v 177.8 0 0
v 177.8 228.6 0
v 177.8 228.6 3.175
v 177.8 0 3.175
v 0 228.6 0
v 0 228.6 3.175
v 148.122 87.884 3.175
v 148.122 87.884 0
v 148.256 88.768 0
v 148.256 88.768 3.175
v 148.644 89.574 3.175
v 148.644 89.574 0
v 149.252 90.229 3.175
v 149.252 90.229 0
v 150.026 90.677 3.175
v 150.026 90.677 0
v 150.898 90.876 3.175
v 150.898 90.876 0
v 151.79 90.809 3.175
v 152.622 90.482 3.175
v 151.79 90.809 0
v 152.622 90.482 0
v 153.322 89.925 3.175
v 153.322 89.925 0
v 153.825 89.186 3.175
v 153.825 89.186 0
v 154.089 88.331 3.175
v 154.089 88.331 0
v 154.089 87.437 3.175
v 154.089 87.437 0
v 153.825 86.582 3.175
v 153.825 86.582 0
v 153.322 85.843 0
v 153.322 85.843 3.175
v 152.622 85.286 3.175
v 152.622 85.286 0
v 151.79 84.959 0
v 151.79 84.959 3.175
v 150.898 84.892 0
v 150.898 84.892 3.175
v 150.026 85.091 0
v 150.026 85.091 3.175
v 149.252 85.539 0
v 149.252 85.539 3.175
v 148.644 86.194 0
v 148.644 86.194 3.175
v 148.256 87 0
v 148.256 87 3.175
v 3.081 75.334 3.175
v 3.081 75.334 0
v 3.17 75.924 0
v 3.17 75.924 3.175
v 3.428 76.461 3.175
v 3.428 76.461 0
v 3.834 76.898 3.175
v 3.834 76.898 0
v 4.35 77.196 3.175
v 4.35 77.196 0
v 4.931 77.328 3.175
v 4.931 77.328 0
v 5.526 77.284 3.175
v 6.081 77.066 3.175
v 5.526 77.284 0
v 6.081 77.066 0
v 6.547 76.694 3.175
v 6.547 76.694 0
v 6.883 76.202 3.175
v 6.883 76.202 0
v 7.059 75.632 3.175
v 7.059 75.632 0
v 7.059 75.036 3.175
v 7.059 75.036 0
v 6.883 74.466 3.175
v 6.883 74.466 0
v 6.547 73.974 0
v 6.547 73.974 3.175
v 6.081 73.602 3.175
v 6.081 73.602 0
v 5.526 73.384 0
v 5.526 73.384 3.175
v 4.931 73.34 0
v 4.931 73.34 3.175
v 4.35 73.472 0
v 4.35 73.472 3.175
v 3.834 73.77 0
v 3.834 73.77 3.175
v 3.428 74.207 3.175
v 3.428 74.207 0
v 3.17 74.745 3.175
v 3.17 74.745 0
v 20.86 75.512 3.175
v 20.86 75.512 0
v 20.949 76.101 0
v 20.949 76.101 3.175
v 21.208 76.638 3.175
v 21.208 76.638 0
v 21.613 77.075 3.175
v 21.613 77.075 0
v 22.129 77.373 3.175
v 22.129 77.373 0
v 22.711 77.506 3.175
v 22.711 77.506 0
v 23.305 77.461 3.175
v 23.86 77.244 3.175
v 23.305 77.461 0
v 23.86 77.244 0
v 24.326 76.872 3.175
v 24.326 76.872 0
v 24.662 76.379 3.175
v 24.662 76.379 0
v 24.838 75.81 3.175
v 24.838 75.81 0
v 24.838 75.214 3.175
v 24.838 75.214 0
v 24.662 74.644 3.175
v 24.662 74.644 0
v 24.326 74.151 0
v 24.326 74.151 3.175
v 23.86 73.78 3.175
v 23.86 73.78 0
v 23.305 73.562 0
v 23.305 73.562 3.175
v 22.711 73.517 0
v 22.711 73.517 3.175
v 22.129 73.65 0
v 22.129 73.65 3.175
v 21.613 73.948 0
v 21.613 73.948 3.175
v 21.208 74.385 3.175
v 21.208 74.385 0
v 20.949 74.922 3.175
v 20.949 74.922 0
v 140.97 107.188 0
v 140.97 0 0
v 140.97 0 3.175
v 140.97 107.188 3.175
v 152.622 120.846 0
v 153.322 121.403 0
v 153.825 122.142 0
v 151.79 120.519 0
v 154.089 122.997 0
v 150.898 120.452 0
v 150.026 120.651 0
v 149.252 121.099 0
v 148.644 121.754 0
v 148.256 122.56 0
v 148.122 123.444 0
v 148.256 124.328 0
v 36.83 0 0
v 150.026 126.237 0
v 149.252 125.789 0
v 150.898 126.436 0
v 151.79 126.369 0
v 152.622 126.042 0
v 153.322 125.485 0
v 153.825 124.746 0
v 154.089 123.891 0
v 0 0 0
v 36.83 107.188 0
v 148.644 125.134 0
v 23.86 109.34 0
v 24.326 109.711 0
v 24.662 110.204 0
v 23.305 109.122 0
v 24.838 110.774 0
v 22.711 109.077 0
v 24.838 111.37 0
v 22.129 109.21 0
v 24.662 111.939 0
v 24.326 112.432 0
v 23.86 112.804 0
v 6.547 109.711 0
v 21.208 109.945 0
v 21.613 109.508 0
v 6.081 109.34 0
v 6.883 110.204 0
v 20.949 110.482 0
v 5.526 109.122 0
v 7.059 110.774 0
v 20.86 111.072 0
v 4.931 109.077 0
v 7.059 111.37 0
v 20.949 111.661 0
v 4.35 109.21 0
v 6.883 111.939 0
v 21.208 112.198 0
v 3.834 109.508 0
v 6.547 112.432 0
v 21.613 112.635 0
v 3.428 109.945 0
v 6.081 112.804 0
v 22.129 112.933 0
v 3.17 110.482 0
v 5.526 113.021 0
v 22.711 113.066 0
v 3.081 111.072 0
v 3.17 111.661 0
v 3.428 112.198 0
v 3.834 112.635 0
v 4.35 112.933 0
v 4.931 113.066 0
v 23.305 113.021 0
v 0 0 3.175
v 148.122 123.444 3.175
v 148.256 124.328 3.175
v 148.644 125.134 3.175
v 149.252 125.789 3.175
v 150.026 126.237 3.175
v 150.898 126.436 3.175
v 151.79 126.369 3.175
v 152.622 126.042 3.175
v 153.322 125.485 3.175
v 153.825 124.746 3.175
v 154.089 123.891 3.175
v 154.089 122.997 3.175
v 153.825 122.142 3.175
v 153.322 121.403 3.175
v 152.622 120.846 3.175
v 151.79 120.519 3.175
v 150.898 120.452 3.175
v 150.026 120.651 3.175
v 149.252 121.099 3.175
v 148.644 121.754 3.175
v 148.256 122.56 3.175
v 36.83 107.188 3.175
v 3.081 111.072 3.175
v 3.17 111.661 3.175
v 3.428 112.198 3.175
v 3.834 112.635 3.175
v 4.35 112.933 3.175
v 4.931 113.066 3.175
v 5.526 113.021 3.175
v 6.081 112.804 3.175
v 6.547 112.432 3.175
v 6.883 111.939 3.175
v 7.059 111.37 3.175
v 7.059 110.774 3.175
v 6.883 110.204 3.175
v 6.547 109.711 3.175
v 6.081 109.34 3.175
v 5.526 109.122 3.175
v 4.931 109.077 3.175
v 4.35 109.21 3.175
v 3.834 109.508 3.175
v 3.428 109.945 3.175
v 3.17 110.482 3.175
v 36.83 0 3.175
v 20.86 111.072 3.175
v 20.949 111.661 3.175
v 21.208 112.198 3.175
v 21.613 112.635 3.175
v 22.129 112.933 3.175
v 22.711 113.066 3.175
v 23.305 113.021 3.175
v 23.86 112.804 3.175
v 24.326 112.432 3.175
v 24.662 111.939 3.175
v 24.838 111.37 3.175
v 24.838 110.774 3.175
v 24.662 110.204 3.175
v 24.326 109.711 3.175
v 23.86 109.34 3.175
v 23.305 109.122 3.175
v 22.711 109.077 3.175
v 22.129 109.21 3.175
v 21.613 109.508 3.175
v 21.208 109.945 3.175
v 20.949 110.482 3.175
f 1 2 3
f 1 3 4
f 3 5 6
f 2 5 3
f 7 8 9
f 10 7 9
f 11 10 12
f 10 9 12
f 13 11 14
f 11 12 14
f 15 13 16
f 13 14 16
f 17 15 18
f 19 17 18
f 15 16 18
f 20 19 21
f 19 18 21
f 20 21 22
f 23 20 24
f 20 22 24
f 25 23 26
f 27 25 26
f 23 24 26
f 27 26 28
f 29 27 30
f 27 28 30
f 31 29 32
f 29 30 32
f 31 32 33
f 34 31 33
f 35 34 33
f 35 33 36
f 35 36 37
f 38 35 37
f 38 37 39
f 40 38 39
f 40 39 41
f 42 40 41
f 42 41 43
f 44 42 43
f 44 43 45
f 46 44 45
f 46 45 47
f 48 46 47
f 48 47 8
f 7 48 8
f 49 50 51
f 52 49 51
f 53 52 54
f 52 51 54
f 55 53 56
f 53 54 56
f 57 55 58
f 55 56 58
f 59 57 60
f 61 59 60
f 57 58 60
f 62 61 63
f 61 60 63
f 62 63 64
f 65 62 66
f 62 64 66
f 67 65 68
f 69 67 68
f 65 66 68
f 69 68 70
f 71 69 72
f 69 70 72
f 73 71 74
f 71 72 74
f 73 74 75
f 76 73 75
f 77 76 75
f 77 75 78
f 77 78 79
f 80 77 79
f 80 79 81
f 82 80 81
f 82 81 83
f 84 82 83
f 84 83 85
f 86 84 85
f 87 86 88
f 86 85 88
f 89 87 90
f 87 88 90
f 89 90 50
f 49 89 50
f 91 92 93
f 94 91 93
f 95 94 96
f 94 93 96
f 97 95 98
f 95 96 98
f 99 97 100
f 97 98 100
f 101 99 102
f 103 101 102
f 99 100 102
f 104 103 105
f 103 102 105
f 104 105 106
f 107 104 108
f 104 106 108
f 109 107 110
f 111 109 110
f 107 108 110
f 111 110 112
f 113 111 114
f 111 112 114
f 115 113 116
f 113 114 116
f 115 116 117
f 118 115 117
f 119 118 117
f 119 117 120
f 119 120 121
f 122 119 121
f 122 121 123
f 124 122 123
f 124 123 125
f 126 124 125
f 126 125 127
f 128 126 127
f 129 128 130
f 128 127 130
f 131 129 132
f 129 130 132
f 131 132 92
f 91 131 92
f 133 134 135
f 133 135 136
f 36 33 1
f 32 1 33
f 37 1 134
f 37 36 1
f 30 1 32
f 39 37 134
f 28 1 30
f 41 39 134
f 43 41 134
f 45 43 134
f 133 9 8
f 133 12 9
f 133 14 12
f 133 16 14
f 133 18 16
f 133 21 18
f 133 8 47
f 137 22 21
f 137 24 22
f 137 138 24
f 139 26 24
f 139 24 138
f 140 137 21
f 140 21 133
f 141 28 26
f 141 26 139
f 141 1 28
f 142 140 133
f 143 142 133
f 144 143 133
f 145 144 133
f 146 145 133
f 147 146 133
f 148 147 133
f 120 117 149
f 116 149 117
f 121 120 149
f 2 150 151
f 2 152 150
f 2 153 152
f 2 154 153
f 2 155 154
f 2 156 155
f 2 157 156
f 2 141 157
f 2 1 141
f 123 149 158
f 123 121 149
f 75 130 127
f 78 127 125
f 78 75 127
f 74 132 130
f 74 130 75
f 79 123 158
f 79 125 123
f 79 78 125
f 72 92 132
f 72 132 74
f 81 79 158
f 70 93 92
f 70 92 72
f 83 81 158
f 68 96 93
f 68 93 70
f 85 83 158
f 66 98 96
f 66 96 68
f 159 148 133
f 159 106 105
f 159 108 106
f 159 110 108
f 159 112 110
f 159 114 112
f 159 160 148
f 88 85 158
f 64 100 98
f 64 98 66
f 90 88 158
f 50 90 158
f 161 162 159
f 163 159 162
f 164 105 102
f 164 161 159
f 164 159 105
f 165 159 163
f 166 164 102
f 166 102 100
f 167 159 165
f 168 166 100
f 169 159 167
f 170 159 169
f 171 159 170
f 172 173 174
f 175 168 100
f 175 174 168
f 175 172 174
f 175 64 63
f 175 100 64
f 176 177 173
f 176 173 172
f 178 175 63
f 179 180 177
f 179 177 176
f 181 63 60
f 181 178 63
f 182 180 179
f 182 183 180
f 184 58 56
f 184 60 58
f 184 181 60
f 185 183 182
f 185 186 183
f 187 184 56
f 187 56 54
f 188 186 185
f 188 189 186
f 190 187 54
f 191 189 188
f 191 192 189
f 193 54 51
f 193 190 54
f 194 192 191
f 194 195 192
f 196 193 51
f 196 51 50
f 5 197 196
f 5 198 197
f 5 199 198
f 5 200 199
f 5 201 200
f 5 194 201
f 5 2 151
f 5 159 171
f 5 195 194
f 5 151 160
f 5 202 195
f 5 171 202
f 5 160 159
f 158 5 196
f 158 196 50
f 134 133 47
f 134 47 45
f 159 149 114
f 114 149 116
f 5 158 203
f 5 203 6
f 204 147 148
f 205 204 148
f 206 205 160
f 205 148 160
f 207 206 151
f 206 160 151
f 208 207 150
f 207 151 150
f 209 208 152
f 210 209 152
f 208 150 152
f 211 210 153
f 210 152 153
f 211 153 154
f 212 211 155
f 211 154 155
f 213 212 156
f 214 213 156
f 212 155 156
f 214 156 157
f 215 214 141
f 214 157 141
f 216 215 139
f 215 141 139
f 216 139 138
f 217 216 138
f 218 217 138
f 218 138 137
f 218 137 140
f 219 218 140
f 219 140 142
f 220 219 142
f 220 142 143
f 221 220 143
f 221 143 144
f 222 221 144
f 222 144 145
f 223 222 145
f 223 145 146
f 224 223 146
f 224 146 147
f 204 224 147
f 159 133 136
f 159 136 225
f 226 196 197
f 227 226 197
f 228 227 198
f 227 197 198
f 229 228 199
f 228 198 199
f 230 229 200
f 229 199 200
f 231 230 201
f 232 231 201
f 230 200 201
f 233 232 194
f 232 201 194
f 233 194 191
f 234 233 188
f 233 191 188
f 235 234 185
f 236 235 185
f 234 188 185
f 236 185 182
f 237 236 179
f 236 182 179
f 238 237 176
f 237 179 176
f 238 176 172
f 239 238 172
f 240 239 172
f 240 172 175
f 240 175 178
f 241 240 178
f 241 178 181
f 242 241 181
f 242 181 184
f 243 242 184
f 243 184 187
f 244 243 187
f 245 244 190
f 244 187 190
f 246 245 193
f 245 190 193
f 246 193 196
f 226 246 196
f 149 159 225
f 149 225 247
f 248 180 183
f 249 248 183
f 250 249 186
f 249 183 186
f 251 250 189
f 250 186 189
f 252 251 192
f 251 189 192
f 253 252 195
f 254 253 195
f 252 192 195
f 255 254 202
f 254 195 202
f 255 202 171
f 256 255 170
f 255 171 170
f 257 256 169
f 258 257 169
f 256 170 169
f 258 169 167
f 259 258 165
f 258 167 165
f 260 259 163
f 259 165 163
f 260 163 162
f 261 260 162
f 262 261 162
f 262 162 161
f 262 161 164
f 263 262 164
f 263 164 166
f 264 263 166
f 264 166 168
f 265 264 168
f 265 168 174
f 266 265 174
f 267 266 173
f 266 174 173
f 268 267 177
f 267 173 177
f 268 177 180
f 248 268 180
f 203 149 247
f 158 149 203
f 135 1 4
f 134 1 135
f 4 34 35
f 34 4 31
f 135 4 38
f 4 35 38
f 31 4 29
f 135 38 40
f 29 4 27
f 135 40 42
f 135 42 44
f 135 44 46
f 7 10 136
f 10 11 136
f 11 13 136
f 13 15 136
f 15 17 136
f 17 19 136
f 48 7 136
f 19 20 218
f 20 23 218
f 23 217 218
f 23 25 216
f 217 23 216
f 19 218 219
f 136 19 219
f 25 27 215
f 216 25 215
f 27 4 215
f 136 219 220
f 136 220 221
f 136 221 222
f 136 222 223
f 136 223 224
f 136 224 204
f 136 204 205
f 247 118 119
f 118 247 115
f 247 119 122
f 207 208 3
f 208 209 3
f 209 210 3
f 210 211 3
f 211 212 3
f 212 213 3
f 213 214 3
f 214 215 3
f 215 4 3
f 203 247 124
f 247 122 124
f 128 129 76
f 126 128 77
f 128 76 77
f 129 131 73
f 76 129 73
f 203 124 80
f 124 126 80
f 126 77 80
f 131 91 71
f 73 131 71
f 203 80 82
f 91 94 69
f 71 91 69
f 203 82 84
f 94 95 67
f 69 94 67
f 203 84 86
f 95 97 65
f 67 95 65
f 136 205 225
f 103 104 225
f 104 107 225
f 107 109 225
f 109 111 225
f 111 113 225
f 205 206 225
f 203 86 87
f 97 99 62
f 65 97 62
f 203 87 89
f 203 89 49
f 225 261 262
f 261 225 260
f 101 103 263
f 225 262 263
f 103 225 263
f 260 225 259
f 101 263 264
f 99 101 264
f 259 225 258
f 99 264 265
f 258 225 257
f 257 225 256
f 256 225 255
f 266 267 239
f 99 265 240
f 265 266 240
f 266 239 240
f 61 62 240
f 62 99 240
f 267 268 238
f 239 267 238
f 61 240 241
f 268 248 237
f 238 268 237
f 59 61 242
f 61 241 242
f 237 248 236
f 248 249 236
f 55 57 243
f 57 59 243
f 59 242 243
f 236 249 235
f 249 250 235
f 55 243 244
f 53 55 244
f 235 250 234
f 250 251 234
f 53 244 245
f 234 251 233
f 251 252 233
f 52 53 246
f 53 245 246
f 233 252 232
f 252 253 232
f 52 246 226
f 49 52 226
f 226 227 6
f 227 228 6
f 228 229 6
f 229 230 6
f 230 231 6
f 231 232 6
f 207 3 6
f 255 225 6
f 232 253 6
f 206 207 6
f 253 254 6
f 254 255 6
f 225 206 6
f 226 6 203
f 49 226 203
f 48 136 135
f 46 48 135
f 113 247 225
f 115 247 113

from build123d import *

# Parameters (mm, degrees)
BOSS_EXTRUDE1_DEPTH = 3.175
SKETCH2_R           = 2
CUT_EXTRUDE1_DEPTH  = 3.175
SKETCH3_R           = 3
CUT_EXTRUDE2_DEPTH  = 5.08


with BuildPart() as part:
    # Sketch1 → Boss-Extrude1 (new body)
    with BuildSketch(Plane.XY):
        Polygon((0, 0), (0, 228.6), (177.8, 228.6), (177.8, 0), (140.97, 0), (140.97, 107.188), (36.83, 107.188), (36.83, 0), align=None)
    extrude(amount=BOSS_EXTRUDE1_DEPTH)

    # Sketch2 → Cut-Extrude1 (cut)
    with BuildSketch(Plane(origin=(0, 0, 0), x_dir=(-1, 0, 0), z_dir=(0, 0, -1))):
        with Locations((-22.86, 111.071616712)):
            Circle(SKETCH2_R)
        with Locations((-5.080886425, 111.071616712)):
            Circle(SKETCH2_R)
        with Locations((-22.86, 75.511616712)):
            Circle(SKETCH2_R)
        with Locations((-5.080886425, 75.334076645)):
            Circle(SKETCH2_R)
    extrude(amount=-CUT_EXTRUDE1_DEPTH, mode=Mode.SUBTRACT)

    # Sketch3 → Cut-Extrude2 (cut)
    with BuildSketch(Plane(origin=(0, 0, 0), x_dir=(-1, 0, 0), z_dir=(0, 0, -1))):
        with Locations((-151.12245979, 123.444)):
            Circle(SKETCH3_R)
        with Locations((-151.12245979, 87.884)):
            Circle(SKETCH3_R)
    extrude(amount=-CUT_EXTRUDE2_DEPTH, mode=Mode.SUBTRACT)


solid = part.part
